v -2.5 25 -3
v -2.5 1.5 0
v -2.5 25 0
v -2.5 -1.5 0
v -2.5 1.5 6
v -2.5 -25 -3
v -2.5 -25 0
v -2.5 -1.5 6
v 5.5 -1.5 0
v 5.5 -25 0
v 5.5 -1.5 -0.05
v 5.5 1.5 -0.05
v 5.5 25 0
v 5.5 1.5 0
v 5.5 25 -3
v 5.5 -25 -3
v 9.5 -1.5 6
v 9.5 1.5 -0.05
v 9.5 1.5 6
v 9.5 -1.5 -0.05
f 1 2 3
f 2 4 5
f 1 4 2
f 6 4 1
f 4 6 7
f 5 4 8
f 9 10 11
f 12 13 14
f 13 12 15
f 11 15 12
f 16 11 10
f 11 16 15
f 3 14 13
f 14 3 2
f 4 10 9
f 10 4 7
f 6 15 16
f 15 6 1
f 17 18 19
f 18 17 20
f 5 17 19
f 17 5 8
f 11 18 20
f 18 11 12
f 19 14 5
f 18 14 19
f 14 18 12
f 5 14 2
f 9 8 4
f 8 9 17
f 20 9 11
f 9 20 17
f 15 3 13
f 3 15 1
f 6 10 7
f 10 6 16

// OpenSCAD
translate([0,106.0,-10.5]) intersection() {
multmatrix([[0, 0, 1, -2.5], [0, 1, 0, 0], [-1, 0, 0, 0], [0, 0, 0, 1]]) { 
// Archived geometry from ../validation_v7_shorter_beams/previous_current/parts/oobb_organization_storage_drawer_unit_rectangle_100_ml_tamper_evident_systempak_209_container_2_column_2_row_ai_version_7_style_unit_2_wide_2_tall/snap_beam.scad
$fn = 50;

difference() {
	union() {
		translate(v = [0, 0, 0]) {
			rotate(a = [0, 0, 0]) {
				difference() {
					union() {
						translate(v = [0, 0, 2.5]) {
							rotate(a = [0, -90, 0]) {
								difference() {
									union() {
										translate(v = [0, 0, 0]) {
											rotate(a = [0, 0, 0]) {
												difference() {
													union() {
														translate(v = [-2.5, 0, 2.5]) {
															rotate(a = [0, 90.0, 0]) {
																difference() {
																	union() {
																		translate(v = [0, 0, 0]) {
																			rotate(a = [0, 0, 0]) {
																				difference() {
																					union() {
																						translate(v = [0, 0, 0]) {
																							rotate(a = [0, 0, 0]) {
																								difference() {
																									union() {
																										translate(v = [-5.5, -12.0, 0]) {
																											cube(size = [11.0, 20.4, 5.0]);
																										}
																									}
																									union() {
																										translate(v = [0, 0, -0.1]) {
																											linear_extrude(height = 5.2) {
																												polygon(points = [[-2.4, 0], [-2.4, 6.25], [-3.8, 6.1], [-3.8, 6.8999999999999995], [-2.4, 8.299999999999999], [-2.4, 9.399999999999999], [-5.7, 9.399999999999999], [-5.7, 0]]);
																											}
																										}
																										translate(v = [0, 0, -0.1]) {
																											linear_extrude(height = 5.2) {
																												polygon(points = [[-2.35, -4.5], [-2.35, -4.3875], [-2.35, -4.275], [-2.35, -4.1625], [-2.35, -4.05], [-2.35, -3.9375], [-2.35, -3.825], [-2.35, -3.7125], [-2.35, -3.6], [-2.35, -3.4875], [-2.35, -3.375], [-2.35, -3.2625], [-2.35, -3.15], [-2.35, -3.0375], [-2.35, -2.925], [-2.35, -2.8125], [-2.35, -2.7], [-2.35, -2.5875], [-2.35, -2.475], [-2.35, -2.3625], [-2.35, -2.25], [-2.35, -2.1375], [-2.35, -2.025], [-2.35, -1.9125], [-2.35, -1.7999999999999998], [-2.35, -1.6875], [-2.35, -1.5750000000000002], [-2.35, -1.4625], [-2.35, -1.35], [-2.35, -1.2374999999999998], [-2.35, -1.125], [-2.35, -1.0125000000000002], [-2.35, -0.8999999999999999], [-2.35, -0.7875000000000001], [-2.35, -0.6749999999999998], [-2.35, -0.5625], [-2.35, -0.4500000000000002], [-2.35, -0.33750000000000036], [-2.35, -0.22499999999999964], [-2.35, -0.11249999999999982], [-2.35, 0.0], [-2.35, 0.1], [-3.4, 0.1], [-3.4, -4.5]]);
																											}
																										}
																										translate(v = [-2.875, -4.475, -0.1]) {
																											cylinder(h = 5.2, r = 0.55);
																										}
																										translate(v = [0, 0, -0.1]) {
																											linear_extrude(height = 5.2) {
																												polygon(points = [[2.4, 0], [2.4, 6.25], [3.8, 6.1], [3.8, 6.8999999999999995], [2.4, 8.299999999999999], [2.4, 9.399999999999999], [5.7, 9.399999999999999], [5.7, 0]]);
																											}
																										}
																										translate(v = [0, 0, -0.1]) {
																											linear_extrude(height = 5.2) {
																												polygon(points = [[2.35, -4.5], [2.35, -4.3875], [2.35, -4.275], [2.35, -4.1625], [2.35, -4.05], [2.35, -3.9375], [2.35, -3.825], [2.35, -3.7125], [2.35, -3.6], [2.35, -3.4875], [2.35, -3.375], [2.35, -3.2625], [2.35, -3.15], [2.35, -3.0375], [2.35, -2.925], [2.35, -2.8125], [2.35, -2.7], [2.35, -2.5875], [2.35, -2.475], [2.35, -2.3625], [2.35, -2.25], [2.35, -2.1375], [2.35, -2.025], [2.35, -1.9125], [2.35, -1.7999999999999998], [2.35, -1.6875], [2.35, -1.5750000000000002], [2.35, -1.4625], [2.35, -1.35], [2.35, -1.2374999999999998], [2.35, -1.125], [2.35, -1.0125000000000002], [2.35, -0.8999999999999999], [2.35, -0.7875000000000001], [2.35, -0.6749999999999998], [2.35, -0.5625], [2.35, -0.4500000000000002], [2.35, -0.33750000000000036], [2.35, -0.22499999999999964], [2.35, -0.11249999999999982], [2.35, 0.0], [2.35, 0.1], [3.4, 0.1], [3.4, -4.5]]);
																											}
																										}
																										translate(v = [2.875, -4.475, -0.1]) {
																											cylinder(h = 5.2, r = 0.55);
																										}
																										translate(v = [0, 0, -0.1]) {
																											linear_extrude(height = 5.2) {
																												polygon(points = [[-1.2, -3.8499999999999996], [-1.2, -3.6607142857142856], [-1.2, -3.471428571428571], [-1.2, -3.2821428571428566], [-1.2, -3.0928571428571425], [-1.2, -2.9035714285714285], [-1.2, -2.714285714285714], [-1.2, -2.5249999999999995], [-1.2, -2.3357142857142854], [-1.2, -2.1464285714285714], [-1.2, -1.9571428571428569], [-1.2, -1.7678571428571423], [-1.2, -1.5785714285714283], [-1.2, -1.3892857142857138], [-1.2, -1.1999999999999997], [-1.2, -1.0107142857142852], [-1.2, -0.8214285714285712], [-1.2, -0.6321428571428567], [-1.2, -0.4428571428571426], [-1.2, -0.2535714285714281], [-1.2, -0.06428571428571406], [-1.2, 0], [-1.2, 0.12500000000000044], [-1.2, 0.31428571428571495], [-1.2, 0.503571428571429], [-1.2, 0.6928571428571431], [-1.2, 0.8821428571428571], [-1.2, 1.071428571428572], [-1.2, 1.2607142857142861], [-1.2, 1.4500000000000002], [-1.2, 1.6392857142857142], [-1.2, 1.8285714285714292], [-1.2, 2.0178571428571432], [-1.2, 2.2071428571428573], [-1.2, 2.3964285714285714], [-1.2, 2.5857142857142863], [-1.2, 2.7750000000000004], [-1.2, 2.9642857142857144], [-1.2, 3.1535714285714294], [-1.2, 3.3428571428571434], [-1.2, 3.5321428571428575], [-1.2, 3.7214285714285715], [-1.2, 3.9107142857142865], [-1.2, 4.1000000000000005], [-1.2, 4.289285714285715], [-1.2, 4.4785714285714295], [-1.2, 4.667857142857143], [-1.2, 4.857142857142858], [-1.2, 5.046428571428573], [-1.2, 5.235714285714286], [-1.2, 5.425000000000001], [-1.2, 5.614285714285714], [-1.2, 5.803571428571429], [-1.2, 5.992857142857144], [-1.2, 6.1], [-1.2, 6.182142857142857], [-1.2, 6.25], [-1.2, 6.371428571428572], [-1.2, 6.560714285714287], [-1.2, 6.75], [-1.2, 6.939285714285715], [-1.2, 7.128571428571428], [-1.2, 7.317857142857143], [-1.2, 7.507142857142858], [-1.2, 7.696428571428571], [-1.2, 7.885714285714286], [-1.2, 8.075000000000001], [-1.2, 8.264285714285714], [-1.2, 8.45357142857143], [-1.2, 8.642857142857142], [-1.2, 8.832142857142857], [-1.2, 9.021428571428572], [-1.2, 9.210714285714285], [-1.2, 9.4], [1.2, 9.4], [1.2, 9.210714285714285], [1.2, 9.021428571428572], [1.2, 8.832142857142857], [1.2, 8.642857142857142], [1.2, 8.45357142857143], [1.2, 8.264285714285714], [1.2, 8.075000000000001], [1.2, 7.885714285714286], [1.2, 7.696428571428571], [1.2, 7.507142857142858], [1.2, 7.317857142857143], [1.2, 7.128571428571428], [1.2, 6.939285714285715], [1.2, 6.75], [1.2, 6.560714285714287], [1.2, 6.371428571428572], [1.2, 6.25], [1.2, 6.182142857142857], [1.2, 6.1], [1.2, 5.992857142857144], [1.2, 5.803571428571429], [1.2, 5.614285714285714], [1.2, 5.425000000000001], [1.2, 5.235714285714286], [1.2, 5.046428571428573], [1.2, 4.857142857142858], [1.2, 4.667857142857143], [1.2, 4.4785714285714295], [1.2, 4.289285714285715], [1.2, 4.1000000000000005], [1.2, 3.9107142857142865], [1.2, 3.7214285714285715], [1.2, 3.5321428571428575], [1.2, 3.3428571428571434], [1.2, 3.1535714285714294], [1.2, 2.9642857142857144], [1.2, 2.7750000000000004], [1.2, 2.5857142857142863], [1.2, 2.3964285714285714], [1.2, 2.2071428571428573], [1.2, 2.0178571428571432], [1.2, 1.8285714285714292], [1.2, 1.6392857142857142], [1.2, 1.4500000000000002], [1.2, 1.2607142857142861], [1.2, 1.071428571428572], [1.2, 0.8821428571428571], [1.2, 0.6928571428571431], [1.2, 0.503571428571429], [1.2, 0.31428571428571495], [1.2, 0.12500000000000044], [1.2, 0], [1.2, -0.06428571428571406], [1.2, -0.2535714285714281], [1.2, -0.4428571428571426], [1.2, -0.6321428571428567], [1.2, -0.8214285714285712], [1.2, -1.0107142857142852], [1.2, -1.1999999999999997], [1.2, -1.3892857142857138], [1.2, -1.5785714285714283], [1.2, -1.7678571428571423], [1.2, -1.9571428571428569], [1.2, -2.1464285714285714], [1.2, -2.3357142857142854], [1.2, -2.5249999999999995], [1.2, -2.714285714285714], [1.2, -2.9035714285714285], [1.2, -3.0928571428571425], [1.2, -3.2821428571428566], [1.2, -3.471428571428571], [1.2, -3.6607142857142856], [1.2, -3.8499999999999996]]);
																											}
																										}
																										translate(v = [0, -3.8, -0.1]) {
																											cylinder(h = 5.2, r = 1.2249999999999999);
																										}
																									}
																								}
																							}
																						}
																						translate(v = [0, 0, 0]) {
																							rotate(a = [0, 0, 0]) {
																								difference() {
																									union() {
																										translate(v = [-5.5, -12.0, 4.95]) {
																											cube(size = [11.0, 6.5, 2.05]);
																										}
																									}
																									union();
																								}
																							}
																						}
																						translate(v = [-5.5, -12.0, 4.95]) {
																							cube(size = [2.0500000000000003, 12.0, 2.05]);
																						}
																						translate(v = [3.4499999999999997, -12.0, 4.95]) {
																							cube(size = [2.0500000000000003, 12.0, 2.05]);
																						}
																					}
																					union();
																				}
																			}
																		}
																	}
																	union();
																}
															}
														}
													}
													union();
												}
											}
										}
										translate(v = [-2.5, -212.0, 2.5]) {
											rotate(a = [180, -90, 0]) {
												difference() {
													union() {
														translate(v = [0, 0, 0]) {
															rotate(a = [0, 0, 0]) {
																difference() {
																	union() {
																		translate(v = [0, 0, 0]) {
																			rotate(a = [0, 0, 0]) {
																				difference() {
																					union() {
																						translate(v = [-5.5, -12.0, 0]) {
																							cube(size = [11.0, 20.4, 5.0]);
																						}
																					}
																					union() {
																						translate(v = [0, 0, -0.1]) {
																							linear_extrude(height = 5.2) {
																								polygon(points = [[-2.4, 0], [-2.4, 6.25], [-3.8, 6.1], [-3.8, 6.8999999999999995], [-2.4, 8.299999999999999], [-2.4, 9.399999999999999], [-5.7, 9.399999999999999], [-5.7, 0]]);
																							}
																						}
																						translate(v = [0, 0, -0.1]) {
																							linear_extrude(height = 5.2) {
																								polygon(points = [[-2.35, -4.5], [-2.35, -4.3875], [-2.35, -4.275], [-2.35, -4.1625], [-2.35, -4.05], [-2.35, -3.9375], [-2.35, -3.825], [-2.35, -3.7125], [-2.35, -3.6], [-2.35, -3.4875], [-2.35, -3.375], [-2.35, -3.2625], [-2.35, -3.15], [-2.35, -3.0375], [-2.35, -2.925], [-2.35, -2.8125], [-2.35, -2.7], [-2.35, -2.5875], [-2.35, -2.475], [-2.35, -2.3625], [-2.35, -2.25], [-2.35, -2.1375], [-2.35, -2.025], [-2.35, -1.9125], [-2.35, -1.7999999999999998], [-2.35, -1.6875], [-2.35, -1.5750000000000002], [-2.35, -1.4625], [-2.35, -1.35], [-2.35, -1.2374999999999998], [-2.35, -1.125], [-2.35, -1.0125000000000002], [-2.35, -0.8999999999999999], [-2.35, -0.7875000000000001], [-2.35, -0.6749999999999998], [-2.35, -0.5625], [-2.35, -0.4500000000000002], [-2.35, -0.33750000000000036], [-2.35, -0.22499999999999964], [-2.35, -0.11249999999999982], [-2.35, 0.0], [-2.35, 0.1], [-3.4, 0.1], [-3.4, -4.5]]);
																							}
																						}
																						translate(v = [-2.875, -4.475, -0.1]) {
																							cylinder(h = 5.2, r = 0.55);
																						}
																						translate(v = [0, 0, -0.1]) {
																							linear_extrude(height = 5.2) {
																								polygon(points = [[2.4, 0], [2.4, 6.25], [3.8, 6.1], [3.8, 6.8999999999999995], [2.4, 8.299999999999999], [2.4, 9.399999999999999], [5.7, 9.399999999999999], [5.7, 0]]);
																							}
																						}
																						translate(v = [0, 0, -0.1]) {
																							linear_extrude(height = 5.2) {
																								polygon(points = [[2.35, -4.5], [2.35, -4.3875], [2.35, -4.275], [2.35, -4.1625], [2.35, -4.05], [2.35, -3.9375], [2.35, -3.825], [2.35, -3.7125], [2.35, -3.6], [2.35, -3.4875], [2.35, -3.375], [2.35, -3.2625], [2.35, -3.15], [2.35, -3.0375], [2.35, -2.925], [2.35, -2.8125], [2.35, -2.7], [2.35, -2.5875], [2.35, -2.475], [2.35, -2.3625], [2.35, -2.25], [2.35, -2.1375], [2.35, -2.025], [2.35, -1.9125], [2.35, -1.7999999999999998], [2.35, -1.6875], [2.35, -1.5750000000000002], [2.35, -1.4625], [2.35, -1.35], [2.35, -1.2374999999999998], [2.35, -1.125], [2.35, -1.0125000000000002], [2.35, -0.8999999999999999], [2.35, -0.7875000000000001], [2.35, -0.6749999999999998], [2.35, -0.5625], [2.35, -0.4500000000000002], [2.35, -0.33750000000000036], [2.35, -0.22499999999999964], [2.35, -0.11249999999999982], [2.35, 0.0], [2.35, 0.1], [3.4, 0.1], [3.4, -4.5]]);
																							}
																						}
																						translate(v = [2.875, -4.475, -0.1]) {
																							cylinder(h = 5.2, r = 0.55);
																						}
																						translate(v = [0, 0, -0.1]) {
																							linear_extrude(height = 5.2) {
																								polygon(points = [[-1.2, -3.8499999999999996], [-1.2, -3.6607142857142856], [-1.2, -3.471428571428571], [-1.2, -3.2821428571428566], [-1.2, -3.0928571428571425], [-1.2, -2.9035714285714285], [-1.2, -2.714285714285714], [-1.2, -2.5249999999999995], [-1.2, -2.3357142857142854], [-1.2, -2.1464285714285714], [-1.2, -1.9571428571428569], [-1.2, -1.7678571428571423], [-1.2, -1.5785714285714283], [-1.2, -1.3892857142857138], [-1.2, -1.1999999999999997], [-1.2, -1.0107142857142852], [-1.2, -0.8214285714285712], [-1.2, -0.6321428571428567], [-1.2, -0.4428571428571426], [-1.2, -0.2535714285714281], [-1.2, -0.06428571428571406], [-1.2, 0], [-1.2, 0.12500000000000044], [-1.2, 0.31428571428571495], [-1.2, 0.503571428571429], [-1.2, 0.6928571428571431], [-1.2, 0.8821428571428571], [-1.2, 1.071428571428572], [-1.2, 1.2607142857142861], [-1.2, 1.4500000000000002], [-1.2, 1.6392857142857142], [-1.2, 1.8285714285714292], [-1.2, 2.0178571428571432], [-1.2, 2.2071428571428573], [-1.2, 2.3964285714285714], [-1.2, 2.5857142857142863], [-1.2, 2.7750000000000004], [-1.2, 2.9642857142857144], [-1.2, 3.1535714285714294], [-1.2, 3.3428571428571434], [-1.2, 3.5321428571428575], [-1.2, 3.7214285714285715], [-1.2, 3.9107142857142865], [-1.2, 4.1000000000000005], [-1.2, 4.289285714285715], [-1.2, 4.4785714285714295], [-1.2, 4.667857142857143], [-1.2, 4.857142857142858], [-1.2, 5.046428571428573], [-1.2, 5.235714285714286], [-1.2, 5.425000000000001], [-1.2, 5.614285714285714], [-1.2, 5.803571428571429], [-1.2, 5.992857142857144], [-1.2, 6.1], [-1.2, 6.182142857142857], [-1.2, 6.25], [-1.2, 6.371428571428572], [-1.2, 6.560714285714287], [-1.2, 6.75], [-1.2, 6.939285714285715], [-1.2, 7.128571428571428], [-1.2, 7.317857142857143], [-1.2, 7.507142857142858], [-1.2, 7.696428571428571], [-1.2, 7.885714285714286], [-1.2, 8.075000000000001], [-1.2, 8.264285714285714], [-1.2, 8.45357142857143], [-1.2, 8.642857142857142], [-1.2, 8.832142857142857], [-1.2, 9.021428571428572], [-1.2, 9.210714285714285], [-1.2, 9.4], [1.2, 9.4], [1.2, 9.210714285714285], [1.2, 9.021428571428572], [1.2, 8.832142857142857], [1.2, 8.642857142857142], [1.2, 8.45357142857143], [1.2, 8.264285714285714], [1.2, 8.075000000000001], [1.2, 7.885714285714286], [1.2, 7.696428571428571], [1.2, 7.507142857142858], [1.2, 7.317857142857143], [1.2, 7.128571428571428], [1.2, 6.939285714285715], [1.2, 6.75], [1.2, 6.560714285714287], [1.2, 6.371428571428572], [1.2, 6.25], [1.2, 6.182142857142857], [1.2, 6.1], [1.2, 5.992857142857144], [1.2, 5.803571428571429], [1.2, 5.614285714285714], [1.2, 5.425000000000001], [1.2, 5.235714285714286], [1.2, 5.046428571428573], [1.2, 4.857142857142858], [1.2, 4.667857142857143], [1.2, 4.4785714285714295], [1.2, 4.289285714285715], [1.2, 4.1000000000000005], [1.2, 3.9107142857142865], [1.2, 3.7214285714285715], [1.2, 3.5321428571428575], [1.2, 3.3428571428571434], [1.2, 3.1535714285714294], [1.2, 2.9642857142857144], [1.2, 2.7750000000000004], [1.2, 2.5857142857142863], [1.2, 2.3964285714285714], [1.2, 2.2071428571428573], [1.2, 2.0178571428571432], [1.2, 1.8285714285714292], [1.2, 1.6392857142857142], [1.2, 1.4500000000000002], [1.2, 1.2607142857142861], [1.2, 1.071428571428572], [1.2, 0.8821428571428571], [1.2, 0.6928571428571431], [1.2, 0.503571428571429], [1.2, 0.31428571428571495], [1.2, 0.12500000000000044], [1.2, 0], [1.2, -0.06428571428571406], [1.2, -0.2535714285714281], [1.2, -0.4428571428571426], [1.2, -0.6321428571428567], [1.2, -0.8214285714285712], [1.2, -1.0107142857142852], [1.2, -1.1999999999999997], [1.2, -1.3892857142857138], [1.2, -1.5785714285714283], [1.2, -1.7678571428571423], [1.2, -1.9571428571428569], [1.2, -2.1464285714285714], [1.2, -2.3357142857142854], [1.2, -2.5249999999999995], [1.2, -2.714285714285714], [1.2, -2.9035714285714285], [1.2, -3.0928571428571425], [1.2, -3.2821428571428566], [1.2, -3.471428571428571], [1.2, -3.6607142857142856], [1.2, -3.8499999999999996]]);
																							}
																						}
																						translate(v = [0, -3.8, -0.1]) {
																							cylinder(h = 5.2, r = 1.2249999999999999);
																						}
																					}
																				}
																			}
																		}
																		translate(v = [0, 0, 0]) {
																			rotate(a = [0, 0, 0]) {
																				difference() {
																					union() {
																						translate(v = [-5.5, -12.0, 4.95]) {
																							cube(size = [11.0, 6.5, 2.05]);
																						}
																					}
																					union();
																				}
																			}
																		}
																		translate(v = [-5.5, -12.0, 4.95]) {
																			cube(size = [2.0500000000000003, 12.0, 2.05]);
																		}
																		translate(v = [3.4499999999999997, -12.0, 4.95]) {
																			cube(size = [2.0500000000000003, 12.0, 2.05]);
																		}
																	}
																	union();
																}
															}
														}
													}
													union();
												}
											}
										}
										translate(v = [-2.5, -211.8, 7.5]) {
											cube(size = [8.0, 211.6, 3.0]);
										}
										translate(v = [-2.5, -107.5, 10.45]) {
											cube(size = [12.0, 3.0, 6.05]);
										}
									}
									union();
								}
							}
						}
					}
					union();
				}
			}
		}
	}
	union();
}
 }
translate([-4,-131.0,7.4]) cube([15,50,9.3]);
}
